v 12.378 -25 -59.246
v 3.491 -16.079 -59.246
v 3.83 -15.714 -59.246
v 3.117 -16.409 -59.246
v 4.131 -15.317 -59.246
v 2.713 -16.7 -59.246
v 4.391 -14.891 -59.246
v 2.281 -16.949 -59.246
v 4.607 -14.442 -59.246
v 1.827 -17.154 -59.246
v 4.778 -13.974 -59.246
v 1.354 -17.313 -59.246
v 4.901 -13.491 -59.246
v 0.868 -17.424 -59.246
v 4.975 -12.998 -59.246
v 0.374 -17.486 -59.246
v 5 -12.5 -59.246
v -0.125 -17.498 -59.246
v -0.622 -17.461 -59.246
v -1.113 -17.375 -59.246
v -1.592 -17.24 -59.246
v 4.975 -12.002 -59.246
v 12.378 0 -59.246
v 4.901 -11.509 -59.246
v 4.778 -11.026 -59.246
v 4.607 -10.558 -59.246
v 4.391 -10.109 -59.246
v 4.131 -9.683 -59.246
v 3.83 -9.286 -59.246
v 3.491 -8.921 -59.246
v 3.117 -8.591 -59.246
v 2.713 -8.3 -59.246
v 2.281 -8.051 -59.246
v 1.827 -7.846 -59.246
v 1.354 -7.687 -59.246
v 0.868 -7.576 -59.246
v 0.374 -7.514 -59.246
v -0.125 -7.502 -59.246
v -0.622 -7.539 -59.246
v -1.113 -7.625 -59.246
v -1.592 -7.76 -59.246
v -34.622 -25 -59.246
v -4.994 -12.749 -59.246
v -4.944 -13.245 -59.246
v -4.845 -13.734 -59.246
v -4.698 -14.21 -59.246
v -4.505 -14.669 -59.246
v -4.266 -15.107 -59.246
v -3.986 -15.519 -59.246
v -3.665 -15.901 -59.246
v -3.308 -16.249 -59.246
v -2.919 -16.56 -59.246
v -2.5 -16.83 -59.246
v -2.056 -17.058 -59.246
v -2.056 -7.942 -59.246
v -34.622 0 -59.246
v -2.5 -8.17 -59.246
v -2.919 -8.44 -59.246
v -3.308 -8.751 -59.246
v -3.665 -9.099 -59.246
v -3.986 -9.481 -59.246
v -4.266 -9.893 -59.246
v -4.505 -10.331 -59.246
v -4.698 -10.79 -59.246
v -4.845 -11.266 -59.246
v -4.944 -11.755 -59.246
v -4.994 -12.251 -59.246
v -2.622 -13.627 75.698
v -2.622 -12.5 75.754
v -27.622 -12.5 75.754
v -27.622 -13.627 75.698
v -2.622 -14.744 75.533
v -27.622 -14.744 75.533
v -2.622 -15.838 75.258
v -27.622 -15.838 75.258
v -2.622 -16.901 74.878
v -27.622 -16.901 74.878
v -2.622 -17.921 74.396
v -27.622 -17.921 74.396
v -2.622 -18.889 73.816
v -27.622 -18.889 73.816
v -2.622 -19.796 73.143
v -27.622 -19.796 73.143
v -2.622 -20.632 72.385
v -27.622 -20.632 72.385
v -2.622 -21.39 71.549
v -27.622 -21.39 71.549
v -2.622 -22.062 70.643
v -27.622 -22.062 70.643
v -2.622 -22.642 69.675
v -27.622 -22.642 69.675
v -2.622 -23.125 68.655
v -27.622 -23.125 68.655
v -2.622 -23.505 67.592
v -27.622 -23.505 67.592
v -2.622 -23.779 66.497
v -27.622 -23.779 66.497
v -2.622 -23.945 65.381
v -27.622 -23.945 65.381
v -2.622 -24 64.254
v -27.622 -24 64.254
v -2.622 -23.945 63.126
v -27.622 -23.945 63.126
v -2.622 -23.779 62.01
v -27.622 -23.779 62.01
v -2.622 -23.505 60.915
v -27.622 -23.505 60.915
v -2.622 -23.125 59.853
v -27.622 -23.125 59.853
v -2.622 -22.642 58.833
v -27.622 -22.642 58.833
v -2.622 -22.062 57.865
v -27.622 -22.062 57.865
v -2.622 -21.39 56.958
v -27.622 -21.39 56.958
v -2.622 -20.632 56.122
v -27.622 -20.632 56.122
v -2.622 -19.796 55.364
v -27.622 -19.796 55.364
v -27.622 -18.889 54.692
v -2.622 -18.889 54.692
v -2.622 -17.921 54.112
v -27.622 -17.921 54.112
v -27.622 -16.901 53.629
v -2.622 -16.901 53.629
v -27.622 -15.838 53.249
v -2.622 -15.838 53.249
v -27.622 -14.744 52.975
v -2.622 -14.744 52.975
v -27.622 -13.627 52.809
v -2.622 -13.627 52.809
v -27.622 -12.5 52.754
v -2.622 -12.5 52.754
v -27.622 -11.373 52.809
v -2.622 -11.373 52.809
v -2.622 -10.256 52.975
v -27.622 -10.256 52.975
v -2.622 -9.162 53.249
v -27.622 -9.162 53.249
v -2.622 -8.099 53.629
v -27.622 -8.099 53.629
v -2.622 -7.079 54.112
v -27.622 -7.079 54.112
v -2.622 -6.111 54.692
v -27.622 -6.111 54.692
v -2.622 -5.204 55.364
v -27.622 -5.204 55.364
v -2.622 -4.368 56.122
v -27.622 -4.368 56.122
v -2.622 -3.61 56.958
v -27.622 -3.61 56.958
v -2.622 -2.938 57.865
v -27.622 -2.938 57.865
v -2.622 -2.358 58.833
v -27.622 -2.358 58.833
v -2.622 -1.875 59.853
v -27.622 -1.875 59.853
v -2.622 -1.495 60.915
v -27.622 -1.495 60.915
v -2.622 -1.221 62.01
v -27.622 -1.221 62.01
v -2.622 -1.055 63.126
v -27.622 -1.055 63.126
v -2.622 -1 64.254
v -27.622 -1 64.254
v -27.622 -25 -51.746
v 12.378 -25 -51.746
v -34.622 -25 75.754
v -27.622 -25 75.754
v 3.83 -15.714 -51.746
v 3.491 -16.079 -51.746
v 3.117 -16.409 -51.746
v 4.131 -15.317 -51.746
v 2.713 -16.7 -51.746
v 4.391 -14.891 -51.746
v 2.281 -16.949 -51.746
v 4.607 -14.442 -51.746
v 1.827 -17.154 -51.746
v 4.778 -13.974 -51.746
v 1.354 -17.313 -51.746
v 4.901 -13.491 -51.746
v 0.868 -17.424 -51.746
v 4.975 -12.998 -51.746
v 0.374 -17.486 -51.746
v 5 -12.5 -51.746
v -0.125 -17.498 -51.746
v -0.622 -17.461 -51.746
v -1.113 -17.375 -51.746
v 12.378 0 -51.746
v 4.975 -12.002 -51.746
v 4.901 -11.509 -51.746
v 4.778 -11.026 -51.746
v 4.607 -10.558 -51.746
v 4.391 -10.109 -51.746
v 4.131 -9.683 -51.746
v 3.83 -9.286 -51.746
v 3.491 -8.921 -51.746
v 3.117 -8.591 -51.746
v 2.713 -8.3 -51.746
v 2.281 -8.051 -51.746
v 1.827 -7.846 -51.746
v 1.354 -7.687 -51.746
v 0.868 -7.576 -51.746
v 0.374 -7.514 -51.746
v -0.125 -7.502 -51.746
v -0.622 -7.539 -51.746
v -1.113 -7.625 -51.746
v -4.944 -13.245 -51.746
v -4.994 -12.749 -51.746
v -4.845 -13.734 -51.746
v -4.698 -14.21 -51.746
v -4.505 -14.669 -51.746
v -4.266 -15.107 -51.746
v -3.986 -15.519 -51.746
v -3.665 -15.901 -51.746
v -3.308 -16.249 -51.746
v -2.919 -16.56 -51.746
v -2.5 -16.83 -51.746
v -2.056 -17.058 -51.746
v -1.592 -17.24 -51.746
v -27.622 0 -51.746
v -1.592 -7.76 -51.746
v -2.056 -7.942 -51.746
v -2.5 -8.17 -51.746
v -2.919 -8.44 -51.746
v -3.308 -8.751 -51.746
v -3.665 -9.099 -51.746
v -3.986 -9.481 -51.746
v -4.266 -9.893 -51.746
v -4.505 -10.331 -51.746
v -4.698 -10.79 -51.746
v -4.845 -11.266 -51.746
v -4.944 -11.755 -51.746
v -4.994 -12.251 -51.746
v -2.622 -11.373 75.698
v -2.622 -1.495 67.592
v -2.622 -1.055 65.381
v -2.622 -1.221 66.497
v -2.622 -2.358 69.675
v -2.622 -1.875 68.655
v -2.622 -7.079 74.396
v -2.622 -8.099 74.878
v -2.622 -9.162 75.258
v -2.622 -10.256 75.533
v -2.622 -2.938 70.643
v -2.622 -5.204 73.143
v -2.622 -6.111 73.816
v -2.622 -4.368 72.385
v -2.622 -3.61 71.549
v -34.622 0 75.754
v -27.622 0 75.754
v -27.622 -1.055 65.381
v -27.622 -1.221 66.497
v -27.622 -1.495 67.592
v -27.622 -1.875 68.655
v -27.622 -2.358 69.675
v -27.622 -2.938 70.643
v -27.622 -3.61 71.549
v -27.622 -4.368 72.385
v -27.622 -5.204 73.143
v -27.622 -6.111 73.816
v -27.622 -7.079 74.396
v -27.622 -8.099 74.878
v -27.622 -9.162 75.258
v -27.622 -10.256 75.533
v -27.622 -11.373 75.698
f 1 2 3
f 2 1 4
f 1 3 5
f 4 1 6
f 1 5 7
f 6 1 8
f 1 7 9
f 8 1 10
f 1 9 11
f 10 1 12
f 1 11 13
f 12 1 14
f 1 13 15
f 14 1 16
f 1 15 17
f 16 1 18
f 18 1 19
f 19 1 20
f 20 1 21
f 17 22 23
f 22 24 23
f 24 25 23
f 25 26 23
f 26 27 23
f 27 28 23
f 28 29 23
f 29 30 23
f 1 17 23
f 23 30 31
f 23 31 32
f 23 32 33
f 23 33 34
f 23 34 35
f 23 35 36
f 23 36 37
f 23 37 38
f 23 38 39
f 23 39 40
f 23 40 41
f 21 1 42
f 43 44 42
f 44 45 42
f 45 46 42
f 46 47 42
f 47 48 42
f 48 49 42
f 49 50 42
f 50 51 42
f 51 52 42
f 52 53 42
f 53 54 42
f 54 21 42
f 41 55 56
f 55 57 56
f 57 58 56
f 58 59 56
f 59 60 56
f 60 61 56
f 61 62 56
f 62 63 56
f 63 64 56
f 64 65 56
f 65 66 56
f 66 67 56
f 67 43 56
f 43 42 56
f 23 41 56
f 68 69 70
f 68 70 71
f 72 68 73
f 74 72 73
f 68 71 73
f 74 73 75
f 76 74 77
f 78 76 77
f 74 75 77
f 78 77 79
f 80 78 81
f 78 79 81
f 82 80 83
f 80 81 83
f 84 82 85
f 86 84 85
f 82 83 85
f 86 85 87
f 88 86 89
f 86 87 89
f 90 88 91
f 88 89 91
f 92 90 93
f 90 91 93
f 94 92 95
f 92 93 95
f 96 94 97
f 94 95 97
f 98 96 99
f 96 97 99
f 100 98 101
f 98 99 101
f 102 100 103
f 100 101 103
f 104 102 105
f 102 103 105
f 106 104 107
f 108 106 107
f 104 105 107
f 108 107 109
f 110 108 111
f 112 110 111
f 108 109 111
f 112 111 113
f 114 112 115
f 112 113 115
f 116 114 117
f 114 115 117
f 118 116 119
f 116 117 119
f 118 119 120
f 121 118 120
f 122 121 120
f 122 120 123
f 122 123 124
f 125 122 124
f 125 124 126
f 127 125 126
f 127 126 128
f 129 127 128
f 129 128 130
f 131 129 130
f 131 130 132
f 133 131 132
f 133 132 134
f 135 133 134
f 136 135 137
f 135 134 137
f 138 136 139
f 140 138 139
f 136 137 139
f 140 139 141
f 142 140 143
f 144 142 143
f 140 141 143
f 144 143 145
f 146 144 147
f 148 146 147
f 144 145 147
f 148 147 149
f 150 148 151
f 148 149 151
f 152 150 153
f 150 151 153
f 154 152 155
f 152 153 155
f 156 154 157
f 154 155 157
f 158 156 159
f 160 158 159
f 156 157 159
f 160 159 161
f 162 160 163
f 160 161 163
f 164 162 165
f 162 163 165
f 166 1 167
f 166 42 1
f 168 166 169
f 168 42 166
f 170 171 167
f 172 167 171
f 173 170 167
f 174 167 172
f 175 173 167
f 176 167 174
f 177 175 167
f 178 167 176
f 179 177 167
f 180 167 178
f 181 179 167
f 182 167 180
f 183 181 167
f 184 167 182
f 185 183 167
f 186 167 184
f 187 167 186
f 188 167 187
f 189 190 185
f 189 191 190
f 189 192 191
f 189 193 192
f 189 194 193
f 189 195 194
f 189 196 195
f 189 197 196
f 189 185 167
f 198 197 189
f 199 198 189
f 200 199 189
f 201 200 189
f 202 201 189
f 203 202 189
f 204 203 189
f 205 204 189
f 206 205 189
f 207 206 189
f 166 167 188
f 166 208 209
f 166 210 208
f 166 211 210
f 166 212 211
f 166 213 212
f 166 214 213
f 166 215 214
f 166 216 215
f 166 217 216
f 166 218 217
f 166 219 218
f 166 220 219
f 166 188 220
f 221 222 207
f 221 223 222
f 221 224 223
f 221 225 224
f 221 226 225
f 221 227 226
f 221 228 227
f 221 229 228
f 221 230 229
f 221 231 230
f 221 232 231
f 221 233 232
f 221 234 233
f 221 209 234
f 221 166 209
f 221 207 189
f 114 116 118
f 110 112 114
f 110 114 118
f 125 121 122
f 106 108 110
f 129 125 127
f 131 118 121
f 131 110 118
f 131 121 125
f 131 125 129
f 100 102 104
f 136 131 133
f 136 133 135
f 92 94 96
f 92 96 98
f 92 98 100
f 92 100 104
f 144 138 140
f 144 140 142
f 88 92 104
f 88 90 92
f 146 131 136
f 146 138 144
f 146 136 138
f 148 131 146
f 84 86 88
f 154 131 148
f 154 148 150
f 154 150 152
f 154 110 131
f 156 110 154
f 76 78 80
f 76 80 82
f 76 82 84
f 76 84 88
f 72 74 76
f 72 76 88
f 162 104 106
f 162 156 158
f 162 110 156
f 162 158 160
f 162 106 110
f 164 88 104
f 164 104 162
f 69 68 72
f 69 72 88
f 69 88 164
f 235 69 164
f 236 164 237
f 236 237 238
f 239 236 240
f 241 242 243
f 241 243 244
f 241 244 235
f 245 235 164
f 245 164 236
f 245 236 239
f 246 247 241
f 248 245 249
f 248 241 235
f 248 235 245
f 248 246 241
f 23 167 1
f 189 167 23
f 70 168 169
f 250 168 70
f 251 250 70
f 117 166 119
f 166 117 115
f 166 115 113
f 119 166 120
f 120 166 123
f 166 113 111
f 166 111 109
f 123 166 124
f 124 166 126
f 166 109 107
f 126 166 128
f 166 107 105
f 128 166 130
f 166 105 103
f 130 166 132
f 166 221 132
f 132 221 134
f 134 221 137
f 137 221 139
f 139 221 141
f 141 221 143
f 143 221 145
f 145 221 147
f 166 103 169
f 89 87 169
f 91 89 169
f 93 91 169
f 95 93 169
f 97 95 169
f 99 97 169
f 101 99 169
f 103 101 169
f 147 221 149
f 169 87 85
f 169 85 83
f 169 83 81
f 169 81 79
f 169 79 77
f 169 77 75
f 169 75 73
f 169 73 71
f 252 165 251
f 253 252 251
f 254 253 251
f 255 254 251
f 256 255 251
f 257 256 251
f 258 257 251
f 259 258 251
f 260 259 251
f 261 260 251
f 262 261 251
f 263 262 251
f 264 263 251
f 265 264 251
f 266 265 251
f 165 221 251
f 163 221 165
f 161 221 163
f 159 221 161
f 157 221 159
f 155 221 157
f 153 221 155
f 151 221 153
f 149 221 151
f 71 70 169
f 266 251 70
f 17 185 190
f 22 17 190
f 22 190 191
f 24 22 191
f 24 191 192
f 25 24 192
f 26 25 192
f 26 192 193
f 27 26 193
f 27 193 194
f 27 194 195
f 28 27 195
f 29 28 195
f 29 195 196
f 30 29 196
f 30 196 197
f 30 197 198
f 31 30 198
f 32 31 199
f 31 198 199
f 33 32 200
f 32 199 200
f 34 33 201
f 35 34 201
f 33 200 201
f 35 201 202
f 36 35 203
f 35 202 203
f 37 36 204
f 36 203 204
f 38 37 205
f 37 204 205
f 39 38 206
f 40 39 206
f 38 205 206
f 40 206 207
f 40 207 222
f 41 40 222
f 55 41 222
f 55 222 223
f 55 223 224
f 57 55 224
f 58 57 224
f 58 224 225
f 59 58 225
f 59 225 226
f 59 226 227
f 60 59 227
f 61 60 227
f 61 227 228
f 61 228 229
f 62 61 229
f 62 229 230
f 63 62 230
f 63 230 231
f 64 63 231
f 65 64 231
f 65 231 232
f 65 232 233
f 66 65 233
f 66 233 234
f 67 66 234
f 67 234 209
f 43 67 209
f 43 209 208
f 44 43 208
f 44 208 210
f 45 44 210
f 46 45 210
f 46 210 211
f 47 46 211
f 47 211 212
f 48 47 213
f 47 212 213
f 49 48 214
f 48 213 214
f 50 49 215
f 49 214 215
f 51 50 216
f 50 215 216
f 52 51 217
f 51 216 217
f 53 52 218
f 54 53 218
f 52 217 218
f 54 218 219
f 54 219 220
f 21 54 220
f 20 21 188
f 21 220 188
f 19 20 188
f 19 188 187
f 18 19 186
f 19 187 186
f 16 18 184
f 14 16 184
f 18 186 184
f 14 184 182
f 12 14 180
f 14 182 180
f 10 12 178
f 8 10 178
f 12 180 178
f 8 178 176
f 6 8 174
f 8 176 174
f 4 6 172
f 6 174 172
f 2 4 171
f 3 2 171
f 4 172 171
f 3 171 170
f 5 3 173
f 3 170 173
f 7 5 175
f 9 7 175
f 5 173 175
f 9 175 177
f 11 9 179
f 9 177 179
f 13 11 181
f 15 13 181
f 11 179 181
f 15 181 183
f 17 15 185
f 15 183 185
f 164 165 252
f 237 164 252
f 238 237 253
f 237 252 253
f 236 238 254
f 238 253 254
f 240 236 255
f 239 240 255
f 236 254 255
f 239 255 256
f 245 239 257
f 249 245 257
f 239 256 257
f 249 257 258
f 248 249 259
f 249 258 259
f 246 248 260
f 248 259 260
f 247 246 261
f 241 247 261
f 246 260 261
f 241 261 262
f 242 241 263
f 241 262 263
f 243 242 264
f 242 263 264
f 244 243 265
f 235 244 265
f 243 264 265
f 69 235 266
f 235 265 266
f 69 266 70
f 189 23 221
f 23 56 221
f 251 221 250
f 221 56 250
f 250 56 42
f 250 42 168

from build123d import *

# Parameters (mm, degrees)
F0_W     = 7
F0_H     = 135
F1_DEPTH = 25
F3_DEPTH = 25
F4_W     = 25
F4_H     = 7.5
F5_DEPTH = 40
F7_R     = 5
F8_DEPTH = 7.501


with BuildPart() as f1:
    # F0 (on Front) → F1 (new body)
    with BuildSketch(Plane.XZ):
        with Locations((-31.12164, 8.253676)):
            Rectangle(F0_W, F0_H)
    extrude(amount=F1_DEPTH)

    # F2 (on face) → F3 (join)
    with BuildSketch(Plane.YZ.offset(-27.62164)):
        with BuildLine():
            ThreePointArc((-12.5, 75.753676), (-20.631728, 56.121948), (-1, 64.253676))
            ThreePointArc((-1, 64.253676), (-4.368272, 72.385404), (-12.5, 75.753676))
        make_face()
    extrude(amount=F3_DEPTH)

    # F4 (on face) → F5 (join)
    with BuildSketch(Plane.YZ.offset(-27.62164)):
        with Locations((-12.5, -55.496324)):
            Rectangle(F4_W, F4_H)
    extrude(amount=F5_DEPTH)

    # F7 (on face) → F8 (cut, through all)
    with BuildSketch(Plane.XY.offset(-51.746324)):
        with Locations((0, -12.5)):
            Circle(F7_R)
    extrude(amount=-F8_DEPTH, mode=Mode.SUBTRACT)


solid = f1.part
